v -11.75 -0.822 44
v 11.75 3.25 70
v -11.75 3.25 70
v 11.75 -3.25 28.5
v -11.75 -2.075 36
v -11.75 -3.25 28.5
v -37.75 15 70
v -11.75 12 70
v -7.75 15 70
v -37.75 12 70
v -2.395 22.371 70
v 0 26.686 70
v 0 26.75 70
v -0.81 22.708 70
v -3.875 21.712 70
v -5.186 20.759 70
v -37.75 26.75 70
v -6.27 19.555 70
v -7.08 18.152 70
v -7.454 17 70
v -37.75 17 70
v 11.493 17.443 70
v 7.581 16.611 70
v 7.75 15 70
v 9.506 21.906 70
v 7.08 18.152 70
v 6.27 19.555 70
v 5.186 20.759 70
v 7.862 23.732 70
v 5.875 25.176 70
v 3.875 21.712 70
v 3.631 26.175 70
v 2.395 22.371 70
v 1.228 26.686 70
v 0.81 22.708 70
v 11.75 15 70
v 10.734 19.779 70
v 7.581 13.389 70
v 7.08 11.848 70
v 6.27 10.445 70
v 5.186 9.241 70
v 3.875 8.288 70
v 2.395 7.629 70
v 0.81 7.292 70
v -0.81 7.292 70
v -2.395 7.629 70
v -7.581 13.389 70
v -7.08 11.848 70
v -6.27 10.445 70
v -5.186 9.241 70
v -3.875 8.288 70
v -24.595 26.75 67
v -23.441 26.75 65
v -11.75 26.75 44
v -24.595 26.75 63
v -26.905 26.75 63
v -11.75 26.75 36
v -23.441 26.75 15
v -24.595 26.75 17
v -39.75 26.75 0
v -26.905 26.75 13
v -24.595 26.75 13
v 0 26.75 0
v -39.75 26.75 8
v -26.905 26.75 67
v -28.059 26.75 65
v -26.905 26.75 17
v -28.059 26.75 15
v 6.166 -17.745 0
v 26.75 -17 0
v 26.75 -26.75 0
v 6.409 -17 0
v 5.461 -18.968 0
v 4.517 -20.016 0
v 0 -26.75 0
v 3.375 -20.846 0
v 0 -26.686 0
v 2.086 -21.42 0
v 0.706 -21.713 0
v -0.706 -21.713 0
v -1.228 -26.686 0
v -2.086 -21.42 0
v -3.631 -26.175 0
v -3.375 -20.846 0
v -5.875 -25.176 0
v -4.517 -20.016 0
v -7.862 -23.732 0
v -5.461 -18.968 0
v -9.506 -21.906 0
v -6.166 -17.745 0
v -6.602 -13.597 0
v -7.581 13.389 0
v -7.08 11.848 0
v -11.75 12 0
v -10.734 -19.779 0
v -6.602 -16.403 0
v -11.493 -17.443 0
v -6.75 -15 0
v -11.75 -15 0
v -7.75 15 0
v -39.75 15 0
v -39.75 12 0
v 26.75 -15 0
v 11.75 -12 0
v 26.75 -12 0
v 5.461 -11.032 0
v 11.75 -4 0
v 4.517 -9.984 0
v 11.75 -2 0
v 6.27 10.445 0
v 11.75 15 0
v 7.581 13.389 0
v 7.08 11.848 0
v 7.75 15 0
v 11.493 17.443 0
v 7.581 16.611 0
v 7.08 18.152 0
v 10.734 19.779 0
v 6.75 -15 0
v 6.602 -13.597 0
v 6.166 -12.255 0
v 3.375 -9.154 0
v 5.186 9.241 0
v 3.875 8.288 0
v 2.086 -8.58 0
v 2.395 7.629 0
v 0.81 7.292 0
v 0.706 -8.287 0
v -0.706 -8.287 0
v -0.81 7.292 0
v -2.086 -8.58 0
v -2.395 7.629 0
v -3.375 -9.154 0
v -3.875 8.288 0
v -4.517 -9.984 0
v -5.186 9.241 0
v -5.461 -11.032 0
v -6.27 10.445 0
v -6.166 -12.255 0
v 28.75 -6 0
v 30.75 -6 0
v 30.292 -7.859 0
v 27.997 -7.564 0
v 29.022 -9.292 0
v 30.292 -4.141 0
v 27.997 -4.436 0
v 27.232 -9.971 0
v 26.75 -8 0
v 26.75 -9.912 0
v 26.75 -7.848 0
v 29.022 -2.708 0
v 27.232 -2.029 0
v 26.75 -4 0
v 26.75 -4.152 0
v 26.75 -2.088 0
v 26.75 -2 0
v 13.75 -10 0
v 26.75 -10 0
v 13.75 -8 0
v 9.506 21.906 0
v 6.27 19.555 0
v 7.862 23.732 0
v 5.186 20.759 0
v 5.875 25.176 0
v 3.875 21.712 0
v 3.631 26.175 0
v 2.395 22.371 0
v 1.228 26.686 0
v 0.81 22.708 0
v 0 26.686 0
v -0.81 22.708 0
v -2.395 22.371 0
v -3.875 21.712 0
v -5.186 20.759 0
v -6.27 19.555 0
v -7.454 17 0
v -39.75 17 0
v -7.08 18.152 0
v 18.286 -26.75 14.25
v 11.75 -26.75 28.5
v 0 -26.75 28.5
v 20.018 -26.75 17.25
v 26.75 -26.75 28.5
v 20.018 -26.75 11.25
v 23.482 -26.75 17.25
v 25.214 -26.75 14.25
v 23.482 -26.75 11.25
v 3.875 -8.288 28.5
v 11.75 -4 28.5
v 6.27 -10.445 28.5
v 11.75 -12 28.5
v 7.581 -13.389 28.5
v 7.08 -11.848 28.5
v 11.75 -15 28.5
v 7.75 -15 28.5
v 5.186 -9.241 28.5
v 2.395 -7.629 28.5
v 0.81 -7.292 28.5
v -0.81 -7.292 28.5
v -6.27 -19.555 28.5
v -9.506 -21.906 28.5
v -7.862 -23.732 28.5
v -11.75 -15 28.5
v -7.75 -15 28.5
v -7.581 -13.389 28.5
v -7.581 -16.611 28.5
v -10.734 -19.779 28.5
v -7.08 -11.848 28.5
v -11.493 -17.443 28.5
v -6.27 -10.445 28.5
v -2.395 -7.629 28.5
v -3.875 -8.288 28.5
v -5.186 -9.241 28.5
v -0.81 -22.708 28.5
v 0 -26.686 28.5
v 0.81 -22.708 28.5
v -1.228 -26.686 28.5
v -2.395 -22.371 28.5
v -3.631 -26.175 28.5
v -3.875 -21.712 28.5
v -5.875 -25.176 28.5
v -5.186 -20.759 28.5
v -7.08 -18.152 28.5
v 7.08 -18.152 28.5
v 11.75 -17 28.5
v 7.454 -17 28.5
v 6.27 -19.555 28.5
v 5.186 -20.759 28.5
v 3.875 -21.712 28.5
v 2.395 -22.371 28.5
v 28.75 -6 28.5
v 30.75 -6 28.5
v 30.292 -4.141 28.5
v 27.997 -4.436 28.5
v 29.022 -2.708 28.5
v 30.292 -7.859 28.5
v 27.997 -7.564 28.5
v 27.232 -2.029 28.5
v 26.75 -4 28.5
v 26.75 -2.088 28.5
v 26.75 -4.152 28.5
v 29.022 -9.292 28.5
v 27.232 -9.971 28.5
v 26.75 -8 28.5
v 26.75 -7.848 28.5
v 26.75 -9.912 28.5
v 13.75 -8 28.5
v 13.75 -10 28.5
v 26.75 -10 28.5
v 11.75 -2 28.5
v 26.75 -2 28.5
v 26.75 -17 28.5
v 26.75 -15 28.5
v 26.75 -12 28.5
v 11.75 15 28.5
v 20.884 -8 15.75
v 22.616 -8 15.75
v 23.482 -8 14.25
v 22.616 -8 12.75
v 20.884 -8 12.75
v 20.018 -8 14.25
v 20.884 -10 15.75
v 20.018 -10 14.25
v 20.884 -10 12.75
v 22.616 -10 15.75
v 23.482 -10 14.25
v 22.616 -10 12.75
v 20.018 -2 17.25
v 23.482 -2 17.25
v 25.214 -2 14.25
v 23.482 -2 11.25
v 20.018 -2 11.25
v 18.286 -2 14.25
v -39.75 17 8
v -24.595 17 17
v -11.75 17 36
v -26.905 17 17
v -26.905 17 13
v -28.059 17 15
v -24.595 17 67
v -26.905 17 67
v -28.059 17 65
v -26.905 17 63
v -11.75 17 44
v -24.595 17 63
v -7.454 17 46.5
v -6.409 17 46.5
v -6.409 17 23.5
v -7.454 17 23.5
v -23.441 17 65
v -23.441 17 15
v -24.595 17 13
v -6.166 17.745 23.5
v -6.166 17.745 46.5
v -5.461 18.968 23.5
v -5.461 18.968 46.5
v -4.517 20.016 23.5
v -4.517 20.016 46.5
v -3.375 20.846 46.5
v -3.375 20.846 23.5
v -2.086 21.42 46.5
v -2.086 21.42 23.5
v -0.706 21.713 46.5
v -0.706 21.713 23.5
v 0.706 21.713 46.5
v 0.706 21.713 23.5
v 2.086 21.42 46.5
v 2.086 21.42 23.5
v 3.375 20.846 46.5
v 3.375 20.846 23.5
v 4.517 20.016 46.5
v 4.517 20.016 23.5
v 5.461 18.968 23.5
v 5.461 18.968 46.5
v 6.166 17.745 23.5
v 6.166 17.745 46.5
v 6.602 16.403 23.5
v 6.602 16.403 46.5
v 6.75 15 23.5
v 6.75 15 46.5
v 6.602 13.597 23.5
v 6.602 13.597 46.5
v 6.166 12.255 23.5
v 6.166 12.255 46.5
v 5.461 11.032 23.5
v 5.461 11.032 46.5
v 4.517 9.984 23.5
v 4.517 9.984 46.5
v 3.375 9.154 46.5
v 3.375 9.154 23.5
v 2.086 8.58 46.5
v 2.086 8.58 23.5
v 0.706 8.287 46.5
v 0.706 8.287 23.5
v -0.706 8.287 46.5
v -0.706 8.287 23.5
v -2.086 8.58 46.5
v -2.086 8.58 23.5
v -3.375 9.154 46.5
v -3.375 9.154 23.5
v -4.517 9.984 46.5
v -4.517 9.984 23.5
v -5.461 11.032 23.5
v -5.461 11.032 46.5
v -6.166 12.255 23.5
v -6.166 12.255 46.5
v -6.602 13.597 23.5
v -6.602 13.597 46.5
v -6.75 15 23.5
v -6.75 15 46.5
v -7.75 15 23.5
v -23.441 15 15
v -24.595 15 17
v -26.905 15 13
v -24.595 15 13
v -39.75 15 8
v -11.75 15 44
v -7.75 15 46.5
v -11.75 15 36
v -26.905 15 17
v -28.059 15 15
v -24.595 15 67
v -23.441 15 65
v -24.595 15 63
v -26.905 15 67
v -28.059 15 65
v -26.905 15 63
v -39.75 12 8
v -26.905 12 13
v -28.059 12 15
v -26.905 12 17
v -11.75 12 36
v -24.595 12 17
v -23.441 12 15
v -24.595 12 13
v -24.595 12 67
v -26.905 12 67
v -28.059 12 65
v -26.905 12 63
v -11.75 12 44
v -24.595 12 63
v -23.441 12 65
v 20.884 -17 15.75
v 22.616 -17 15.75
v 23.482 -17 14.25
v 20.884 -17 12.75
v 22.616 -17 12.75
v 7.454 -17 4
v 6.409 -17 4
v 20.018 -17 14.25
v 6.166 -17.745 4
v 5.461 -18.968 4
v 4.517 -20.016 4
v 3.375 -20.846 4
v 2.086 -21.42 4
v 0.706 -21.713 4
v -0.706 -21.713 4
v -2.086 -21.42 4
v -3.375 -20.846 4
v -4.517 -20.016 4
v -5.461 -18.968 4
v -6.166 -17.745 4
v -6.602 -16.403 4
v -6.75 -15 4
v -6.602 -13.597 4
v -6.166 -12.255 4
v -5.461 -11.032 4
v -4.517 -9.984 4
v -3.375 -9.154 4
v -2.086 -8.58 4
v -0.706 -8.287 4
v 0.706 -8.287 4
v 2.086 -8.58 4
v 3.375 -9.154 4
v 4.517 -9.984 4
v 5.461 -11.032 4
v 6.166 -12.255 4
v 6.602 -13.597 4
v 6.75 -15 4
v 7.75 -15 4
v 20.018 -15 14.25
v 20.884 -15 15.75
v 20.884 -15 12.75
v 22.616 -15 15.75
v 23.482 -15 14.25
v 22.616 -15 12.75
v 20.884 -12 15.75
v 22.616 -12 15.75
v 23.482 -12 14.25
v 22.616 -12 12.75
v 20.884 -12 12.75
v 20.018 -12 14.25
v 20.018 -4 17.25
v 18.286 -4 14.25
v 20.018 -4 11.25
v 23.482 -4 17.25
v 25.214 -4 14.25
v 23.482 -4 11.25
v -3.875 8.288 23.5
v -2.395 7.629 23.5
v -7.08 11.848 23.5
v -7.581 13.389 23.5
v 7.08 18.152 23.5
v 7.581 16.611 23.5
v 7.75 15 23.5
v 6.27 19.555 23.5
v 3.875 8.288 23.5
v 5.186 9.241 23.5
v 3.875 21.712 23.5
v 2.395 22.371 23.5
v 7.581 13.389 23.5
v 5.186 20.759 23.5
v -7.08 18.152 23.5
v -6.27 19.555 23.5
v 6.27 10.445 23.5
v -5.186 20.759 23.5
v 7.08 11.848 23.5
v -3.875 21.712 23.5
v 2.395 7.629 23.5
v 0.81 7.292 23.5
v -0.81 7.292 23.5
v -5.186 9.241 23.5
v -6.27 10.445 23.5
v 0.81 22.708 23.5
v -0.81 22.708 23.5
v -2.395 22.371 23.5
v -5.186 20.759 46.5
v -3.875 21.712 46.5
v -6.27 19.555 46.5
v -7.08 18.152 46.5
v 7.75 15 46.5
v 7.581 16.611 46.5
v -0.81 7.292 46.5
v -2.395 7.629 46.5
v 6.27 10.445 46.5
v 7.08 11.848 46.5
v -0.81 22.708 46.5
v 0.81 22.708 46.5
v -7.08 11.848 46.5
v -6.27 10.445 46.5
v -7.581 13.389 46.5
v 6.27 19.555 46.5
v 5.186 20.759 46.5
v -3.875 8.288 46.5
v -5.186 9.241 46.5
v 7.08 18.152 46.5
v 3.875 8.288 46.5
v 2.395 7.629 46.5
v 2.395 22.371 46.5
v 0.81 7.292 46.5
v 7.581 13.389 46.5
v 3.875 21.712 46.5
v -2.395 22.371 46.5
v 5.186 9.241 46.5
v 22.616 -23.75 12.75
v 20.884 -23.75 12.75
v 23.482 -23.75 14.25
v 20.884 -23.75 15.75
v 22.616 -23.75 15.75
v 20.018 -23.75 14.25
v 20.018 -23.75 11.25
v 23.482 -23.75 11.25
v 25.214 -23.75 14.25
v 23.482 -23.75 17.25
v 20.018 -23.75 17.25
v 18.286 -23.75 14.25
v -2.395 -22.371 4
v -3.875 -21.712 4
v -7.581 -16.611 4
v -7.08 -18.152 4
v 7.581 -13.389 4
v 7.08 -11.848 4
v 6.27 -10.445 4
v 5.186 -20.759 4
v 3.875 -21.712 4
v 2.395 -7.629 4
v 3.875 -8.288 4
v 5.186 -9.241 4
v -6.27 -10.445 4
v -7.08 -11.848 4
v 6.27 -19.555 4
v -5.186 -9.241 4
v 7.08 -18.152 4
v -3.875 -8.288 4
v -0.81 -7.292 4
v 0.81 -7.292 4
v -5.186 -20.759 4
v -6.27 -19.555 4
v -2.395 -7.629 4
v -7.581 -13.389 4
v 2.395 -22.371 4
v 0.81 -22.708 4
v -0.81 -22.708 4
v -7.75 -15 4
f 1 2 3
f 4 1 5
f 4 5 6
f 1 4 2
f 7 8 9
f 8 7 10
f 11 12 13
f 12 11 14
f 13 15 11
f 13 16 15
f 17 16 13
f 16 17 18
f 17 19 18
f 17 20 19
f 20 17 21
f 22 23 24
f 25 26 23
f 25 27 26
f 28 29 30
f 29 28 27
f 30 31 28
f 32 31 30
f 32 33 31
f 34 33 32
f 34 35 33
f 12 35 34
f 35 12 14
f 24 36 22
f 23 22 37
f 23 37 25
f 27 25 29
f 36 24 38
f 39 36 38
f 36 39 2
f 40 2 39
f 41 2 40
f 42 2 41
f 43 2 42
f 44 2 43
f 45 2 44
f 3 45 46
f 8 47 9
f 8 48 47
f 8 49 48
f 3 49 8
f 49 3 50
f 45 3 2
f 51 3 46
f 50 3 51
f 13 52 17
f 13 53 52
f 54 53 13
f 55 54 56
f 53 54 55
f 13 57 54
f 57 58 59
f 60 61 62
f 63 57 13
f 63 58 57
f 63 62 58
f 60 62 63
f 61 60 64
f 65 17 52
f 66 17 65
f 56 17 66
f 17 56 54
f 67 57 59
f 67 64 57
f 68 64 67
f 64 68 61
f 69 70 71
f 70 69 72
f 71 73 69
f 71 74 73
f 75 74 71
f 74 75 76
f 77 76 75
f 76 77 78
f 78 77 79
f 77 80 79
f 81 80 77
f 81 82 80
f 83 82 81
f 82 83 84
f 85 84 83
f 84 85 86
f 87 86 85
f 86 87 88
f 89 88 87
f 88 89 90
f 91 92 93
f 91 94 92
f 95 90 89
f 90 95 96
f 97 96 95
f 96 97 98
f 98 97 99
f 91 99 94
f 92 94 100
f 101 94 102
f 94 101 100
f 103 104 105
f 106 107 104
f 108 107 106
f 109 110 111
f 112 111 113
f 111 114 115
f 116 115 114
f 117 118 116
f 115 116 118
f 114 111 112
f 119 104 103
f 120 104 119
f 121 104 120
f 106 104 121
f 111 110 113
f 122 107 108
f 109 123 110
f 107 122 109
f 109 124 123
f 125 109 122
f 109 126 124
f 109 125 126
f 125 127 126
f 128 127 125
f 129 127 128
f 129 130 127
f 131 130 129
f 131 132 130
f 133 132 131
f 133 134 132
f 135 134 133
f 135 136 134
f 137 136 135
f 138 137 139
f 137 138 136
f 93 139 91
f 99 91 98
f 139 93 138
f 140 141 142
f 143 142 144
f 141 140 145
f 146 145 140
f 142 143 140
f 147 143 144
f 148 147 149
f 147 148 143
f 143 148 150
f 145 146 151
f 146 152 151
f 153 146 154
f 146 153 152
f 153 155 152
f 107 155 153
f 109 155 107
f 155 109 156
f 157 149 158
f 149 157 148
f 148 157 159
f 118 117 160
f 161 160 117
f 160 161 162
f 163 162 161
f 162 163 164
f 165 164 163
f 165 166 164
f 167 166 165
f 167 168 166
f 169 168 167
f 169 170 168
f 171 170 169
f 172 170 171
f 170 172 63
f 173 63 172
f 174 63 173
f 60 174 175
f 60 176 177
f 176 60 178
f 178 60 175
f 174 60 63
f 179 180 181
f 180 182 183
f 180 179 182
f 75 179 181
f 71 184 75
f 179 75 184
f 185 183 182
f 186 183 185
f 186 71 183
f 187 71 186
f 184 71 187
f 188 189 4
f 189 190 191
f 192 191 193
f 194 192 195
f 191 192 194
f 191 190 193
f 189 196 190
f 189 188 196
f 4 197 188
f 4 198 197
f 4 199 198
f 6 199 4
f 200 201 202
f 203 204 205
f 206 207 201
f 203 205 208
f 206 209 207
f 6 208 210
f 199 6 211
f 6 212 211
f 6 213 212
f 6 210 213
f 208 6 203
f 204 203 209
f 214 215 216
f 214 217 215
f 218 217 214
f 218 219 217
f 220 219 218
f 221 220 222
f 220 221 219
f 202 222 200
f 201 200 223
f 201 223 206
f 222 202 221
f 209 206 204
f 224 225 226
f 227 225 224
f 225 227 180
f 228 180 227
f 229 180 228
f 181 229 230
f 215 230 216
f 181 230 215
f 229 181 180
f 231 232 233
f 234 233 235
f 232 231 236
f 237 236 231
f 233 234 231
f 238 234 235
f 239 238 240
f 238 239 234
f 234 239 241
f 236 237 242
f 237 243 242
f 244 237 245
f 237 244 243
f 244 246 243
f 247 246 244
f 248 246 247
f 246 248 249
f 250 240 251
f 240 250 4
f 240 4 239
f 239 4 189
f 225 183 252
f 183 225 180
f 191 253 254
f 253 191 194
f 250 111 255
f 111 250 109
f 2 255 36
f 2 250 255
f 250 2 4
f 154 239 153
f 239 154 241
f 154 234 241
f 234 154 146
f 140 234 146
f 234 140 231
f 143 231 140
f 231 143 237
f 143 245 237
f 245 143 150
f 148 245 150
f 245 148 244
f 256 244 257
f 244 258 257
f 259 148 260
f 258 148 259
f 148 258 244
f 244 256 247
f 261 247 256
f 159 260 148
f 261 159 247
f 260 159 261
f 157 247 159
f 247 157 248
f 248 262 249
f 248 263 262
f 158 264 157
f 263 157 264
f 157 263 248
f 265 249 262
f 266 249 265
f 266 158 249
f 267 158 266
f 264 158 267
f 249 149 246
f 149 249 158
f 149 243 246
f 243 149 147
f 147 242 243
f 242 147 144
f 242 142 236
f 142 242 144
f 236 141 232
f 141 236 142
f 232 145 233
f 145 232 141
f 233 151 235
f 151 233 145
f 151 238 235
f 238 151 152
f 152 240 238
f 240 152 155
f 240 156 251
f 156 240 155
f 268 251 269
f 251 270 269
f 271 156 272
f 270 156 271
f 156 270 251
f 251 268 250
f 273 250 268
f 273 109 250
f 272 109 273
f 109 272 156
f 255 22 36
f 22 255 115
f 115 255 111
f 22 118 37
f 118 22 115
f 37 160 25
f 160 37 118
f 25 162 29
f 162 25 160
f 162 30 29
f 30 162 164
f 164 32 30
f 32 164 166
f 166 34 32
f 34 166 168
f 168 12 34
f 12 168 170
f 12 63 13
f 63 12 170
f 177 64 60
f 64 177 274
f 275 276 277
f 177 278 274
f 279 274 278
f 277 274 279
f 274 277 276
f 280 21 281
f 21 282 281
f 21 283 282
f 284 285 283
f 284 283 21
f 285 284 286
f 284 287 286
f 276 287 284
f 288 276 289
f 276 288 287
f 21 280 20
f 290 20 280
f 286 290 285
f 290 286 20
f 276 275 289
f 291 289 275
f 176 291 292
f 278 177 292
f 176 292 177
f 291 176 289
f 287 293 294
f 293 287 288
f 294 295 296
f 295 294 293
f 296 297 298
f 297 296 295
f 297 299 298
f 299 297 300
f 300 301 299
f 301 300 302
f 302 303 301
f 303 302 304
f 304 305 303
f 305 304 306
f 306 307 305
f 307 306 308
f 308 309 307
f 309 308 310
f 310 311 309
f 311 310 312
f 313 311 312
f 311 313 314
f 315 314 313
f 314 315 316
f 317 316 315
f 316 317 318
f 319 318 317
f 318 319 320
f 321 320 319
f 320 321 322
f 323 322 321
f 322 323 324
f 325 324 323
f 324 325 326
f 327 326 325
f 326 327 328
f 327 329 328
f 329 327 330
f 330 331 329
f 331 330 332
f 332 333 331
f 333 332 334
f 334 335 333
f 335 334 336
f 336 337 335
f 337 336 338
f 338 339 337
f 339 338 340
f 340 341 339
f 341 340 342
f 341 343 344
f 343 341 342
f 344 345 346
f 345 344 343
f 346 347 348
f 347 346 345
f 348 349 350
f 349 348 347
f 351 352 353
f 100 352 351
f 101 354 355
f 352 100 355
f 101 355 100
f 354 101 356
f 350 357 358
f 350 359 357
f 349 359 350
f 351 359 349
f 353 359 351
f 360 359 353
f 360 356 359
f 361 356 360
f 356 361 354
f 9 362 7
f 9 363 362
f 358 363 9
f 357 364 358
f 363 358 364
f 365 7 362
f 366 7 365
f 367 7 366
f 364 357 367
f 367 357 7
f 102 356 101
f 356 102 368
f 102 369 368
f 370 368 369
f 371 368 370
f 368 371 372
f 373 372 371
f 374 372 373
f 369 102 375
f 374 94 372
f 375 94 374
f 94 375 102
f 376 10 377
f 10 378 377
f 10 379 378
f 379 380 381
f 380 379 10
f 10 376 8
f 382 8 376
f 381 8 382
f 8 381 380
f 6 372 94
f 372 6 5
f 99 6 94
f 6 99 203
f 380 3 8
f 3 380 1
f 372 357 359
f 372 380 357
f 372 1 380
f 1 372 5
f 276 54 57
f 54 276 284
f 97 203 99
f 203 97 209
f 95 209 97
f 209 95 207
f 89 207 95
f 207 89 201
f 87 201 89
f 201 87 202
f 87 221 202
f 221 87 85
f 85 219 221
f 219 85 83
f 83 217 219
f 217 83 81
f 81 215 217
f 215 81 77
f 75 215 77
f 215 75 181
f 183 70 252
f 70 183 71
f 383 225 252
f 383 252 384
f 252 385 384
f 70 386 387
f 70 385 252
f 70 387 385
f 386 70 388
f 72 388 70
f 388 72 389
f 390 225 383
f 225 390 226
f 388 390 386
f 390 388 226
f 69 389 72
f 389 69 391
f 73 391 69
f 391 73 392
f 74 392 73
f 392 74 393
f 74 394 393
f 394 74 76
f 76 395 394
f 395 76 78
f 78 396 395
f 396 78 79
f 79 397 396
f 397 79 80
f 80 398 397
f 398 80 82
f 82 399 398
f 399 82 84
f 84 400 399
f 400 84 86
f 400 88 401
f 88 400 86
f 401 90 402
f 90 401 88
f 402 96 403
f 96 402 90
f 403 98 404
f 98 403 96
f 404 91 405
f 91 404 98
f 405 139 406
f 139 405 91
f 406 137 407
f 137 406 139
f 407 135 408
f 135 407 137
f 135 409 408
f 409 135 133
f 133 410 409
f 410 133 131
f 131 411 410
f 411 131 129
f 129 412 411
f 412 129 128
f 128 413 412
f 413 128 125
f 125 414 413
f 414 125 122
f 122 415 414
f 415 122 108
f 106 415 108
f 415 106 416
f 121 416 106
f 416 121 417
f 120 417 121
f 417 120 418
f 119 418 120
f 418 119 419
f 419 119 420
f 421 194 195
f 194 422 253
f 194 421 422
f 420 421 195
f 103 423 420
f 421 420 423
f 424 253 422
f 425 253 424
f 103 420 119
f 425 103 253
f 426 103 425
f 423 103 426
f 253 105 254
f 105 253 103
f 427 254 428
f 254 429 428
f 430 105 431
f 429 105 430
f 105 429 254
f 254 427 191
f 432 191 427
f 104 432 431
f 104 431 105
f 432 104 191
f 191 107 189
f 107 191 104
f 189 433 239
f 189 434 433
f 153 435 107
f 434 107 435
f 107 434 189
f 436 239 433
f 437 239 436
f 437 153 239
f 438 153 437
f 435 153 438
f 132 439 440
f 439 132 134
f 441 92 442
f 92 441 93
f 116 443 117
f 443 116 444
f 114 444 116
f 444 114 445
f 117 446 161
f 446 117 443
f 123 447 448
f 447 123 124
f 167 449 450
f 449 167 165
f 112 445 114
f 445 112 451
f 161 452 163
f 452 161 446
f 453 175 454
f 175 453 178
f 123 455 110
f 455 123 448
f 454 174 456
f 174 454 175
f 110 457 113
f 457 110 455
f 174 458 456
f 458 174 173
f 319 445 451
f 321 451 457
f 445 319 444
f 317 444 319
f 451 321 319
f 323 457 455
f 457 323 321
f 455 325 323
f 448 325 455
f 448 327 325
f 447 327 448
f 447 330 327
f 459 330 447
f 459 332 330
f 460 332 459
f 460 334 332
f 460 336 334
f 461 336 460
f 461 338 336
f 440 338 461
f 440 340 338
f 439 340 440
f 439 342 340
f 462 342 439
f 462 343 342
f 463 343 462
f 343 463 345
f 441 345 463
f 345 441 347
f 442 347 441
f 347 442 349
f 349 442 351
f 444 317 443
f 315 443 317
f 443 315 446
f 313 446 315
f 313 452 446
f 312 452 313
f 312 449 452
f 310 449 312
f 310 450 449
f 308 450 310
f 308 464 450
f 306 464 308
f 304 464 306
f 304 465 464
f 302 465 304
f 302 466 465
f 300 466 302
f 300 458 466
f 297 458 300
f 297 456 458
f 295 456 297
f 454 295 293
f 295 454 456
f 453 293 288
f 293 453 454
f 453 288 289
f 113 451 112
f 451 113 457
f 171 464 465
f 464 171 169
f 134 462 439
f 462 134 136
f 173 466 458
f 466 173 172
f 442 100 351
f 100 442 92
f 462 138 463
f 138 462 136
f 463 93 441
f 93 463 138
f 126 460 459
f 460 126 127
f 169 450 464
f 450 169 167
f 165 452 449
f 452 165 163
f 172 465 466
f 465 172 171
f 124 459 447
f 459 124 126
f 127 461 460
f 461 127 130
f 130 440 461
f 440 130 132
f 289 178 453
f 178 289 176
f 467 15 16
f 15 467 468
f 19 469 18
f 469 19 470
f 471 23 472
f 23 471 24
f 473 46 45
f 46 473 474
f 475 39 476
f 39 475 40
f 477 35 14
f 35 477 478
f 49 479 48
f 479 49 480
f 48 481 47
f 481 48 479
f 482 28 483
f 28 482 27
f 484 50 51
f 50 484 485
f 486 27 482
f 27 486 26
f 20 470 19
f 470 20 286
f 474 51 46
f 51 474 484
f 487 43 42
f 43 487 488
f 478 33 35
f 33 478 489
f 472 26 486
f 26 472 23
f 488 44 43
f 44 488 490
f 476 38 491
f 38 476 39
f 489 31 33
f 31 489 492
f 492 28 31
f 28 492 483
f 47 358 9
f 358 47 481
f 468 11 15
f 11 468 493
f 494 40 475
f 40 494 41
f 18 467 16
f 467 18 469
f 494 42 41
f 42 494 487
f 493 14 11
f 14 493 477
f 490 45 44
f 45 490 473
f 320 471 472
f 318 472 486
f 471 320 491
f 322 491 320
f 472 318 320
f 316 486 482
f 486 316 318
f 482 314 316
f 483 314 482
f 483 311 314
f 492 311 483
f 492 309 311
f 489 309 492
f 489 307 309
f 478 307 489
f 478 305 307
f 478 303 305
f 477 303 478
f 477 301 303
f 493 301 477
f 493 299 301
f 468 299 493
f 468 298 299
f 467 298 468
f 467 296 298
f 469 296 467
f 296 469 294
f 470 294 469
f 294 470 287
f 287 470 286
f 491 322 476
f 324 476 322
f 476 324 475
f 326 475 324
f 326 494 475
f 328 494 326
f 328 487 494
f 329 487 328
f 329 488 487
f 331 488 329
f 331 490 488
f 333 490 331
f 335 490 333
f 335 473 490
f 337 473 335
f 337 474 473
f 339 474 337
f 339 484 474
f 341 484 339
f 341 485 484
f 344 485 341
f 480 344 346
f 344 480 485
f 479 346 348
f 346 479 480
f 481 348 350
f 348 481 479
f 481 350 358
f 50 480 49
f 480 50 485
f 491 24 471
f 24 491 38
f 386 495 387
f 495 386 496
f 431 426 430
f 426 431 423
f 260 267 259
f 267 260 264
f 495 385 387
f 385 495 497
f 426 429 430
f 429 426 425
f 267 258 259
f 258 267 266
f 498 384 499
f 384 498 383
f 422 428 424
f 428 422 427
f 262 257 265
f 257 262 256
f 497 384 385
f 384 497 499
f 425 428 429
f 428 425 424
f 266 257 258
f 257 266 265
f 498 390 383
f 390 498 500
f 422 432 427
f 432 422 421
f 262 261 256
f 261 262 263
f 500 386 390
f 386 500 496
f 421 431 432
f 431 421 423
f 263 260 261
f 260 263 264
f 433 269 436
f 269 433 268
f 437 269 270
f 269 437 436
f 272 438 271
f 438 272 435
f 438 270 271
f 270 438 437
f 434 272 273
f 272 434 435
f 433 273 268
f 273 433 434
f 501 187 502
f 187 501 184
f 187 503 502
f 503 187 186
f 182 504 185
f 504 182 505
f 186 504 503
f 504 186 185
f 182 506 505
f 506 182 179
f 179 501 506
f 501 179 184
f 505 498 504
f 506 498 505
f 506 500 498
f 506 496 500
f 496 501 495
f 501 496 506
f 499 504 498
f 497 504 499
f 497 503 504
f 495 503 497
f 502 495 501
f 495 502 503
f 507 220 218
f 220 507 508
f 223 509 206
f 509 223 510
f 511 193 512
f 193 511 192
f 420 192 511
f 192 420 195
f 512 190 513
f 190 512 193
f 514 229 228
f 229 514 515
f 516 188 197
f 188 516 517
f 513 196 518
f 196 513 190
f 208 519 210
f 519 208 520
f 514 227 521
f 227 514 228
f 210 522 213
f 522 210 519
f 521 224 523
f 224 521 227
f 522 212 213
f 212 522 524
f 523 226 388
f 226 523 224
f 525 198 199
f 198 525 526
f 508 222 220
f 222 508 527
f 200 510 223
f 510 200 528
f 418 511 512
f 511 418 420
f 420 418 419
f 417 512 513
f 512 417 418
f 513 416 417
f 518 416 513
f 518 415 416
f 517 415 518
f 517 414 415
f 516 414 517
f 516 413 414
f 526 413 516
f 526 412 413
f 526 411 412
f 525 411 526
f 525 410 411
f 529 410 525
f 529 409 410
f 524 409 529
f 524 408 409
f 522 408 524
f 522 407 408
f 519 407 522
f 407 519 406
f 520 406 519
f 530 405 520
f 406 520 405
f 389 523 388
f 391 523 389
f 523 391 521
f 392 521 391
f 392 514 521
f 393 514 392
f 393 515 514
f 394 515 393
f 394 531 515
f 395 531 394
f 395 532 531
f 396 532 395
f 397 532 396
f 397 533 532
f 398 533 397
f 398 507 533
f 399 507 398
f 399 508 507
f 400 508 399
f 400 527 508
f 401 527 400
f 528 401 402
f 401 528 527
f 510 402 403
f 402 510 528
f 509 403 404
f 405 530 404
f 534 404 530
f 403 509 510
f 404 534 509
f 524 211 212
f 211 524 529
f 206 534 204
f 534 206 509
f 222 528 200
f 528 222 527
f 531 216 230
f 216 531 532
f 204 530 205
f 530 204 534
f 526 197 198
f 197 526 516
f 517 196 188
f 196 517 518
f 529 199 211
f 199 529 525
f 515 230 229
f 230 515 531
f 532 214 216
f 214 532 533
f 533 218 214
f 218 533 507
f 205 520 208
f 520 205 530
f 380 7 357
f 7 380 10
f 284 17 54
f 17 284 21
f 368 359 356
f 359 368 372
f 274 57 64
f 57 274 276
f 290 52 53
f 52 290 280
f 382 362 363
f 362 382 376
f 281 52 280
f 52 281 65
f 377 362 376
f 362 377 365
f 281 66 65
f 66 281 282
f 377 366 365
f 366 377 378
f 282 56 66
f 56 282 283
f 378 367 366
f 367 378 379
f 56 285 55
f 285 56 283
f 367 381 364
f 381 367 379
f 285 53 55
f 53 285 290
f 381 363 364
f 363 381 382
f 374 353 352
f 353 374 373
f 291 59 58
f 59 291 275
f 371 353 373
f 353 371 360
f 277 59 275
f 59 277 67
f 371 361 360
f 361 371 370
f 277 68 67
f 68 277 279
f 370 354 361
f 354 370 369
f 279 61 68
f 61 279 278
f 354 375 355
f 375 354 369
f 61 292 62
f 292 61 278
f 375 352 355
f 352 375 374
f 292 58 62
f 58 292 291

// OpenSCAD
// file: settings.scad
rod_size = 8;
rod_nut_size = 15; //12 for M6, 15 for M8
bearing_size = 15.5; //12.5 for LM6UU, 15.5 for LM8UU,LM8SUU
bearing_length = 24.5; //19.5 for LM6UU, 17.5 for LM8SUU, 24.5 for LM8UU
yz_motor_distance = 25;
motor_screw_spacing = 26; //26 for NEMA14, 31 for NEMA17
motor_casing = 38; //38 for NEMA14, 45 for NEMA17
end_height = 40; //measure the height of your motor casing and add 4mm. Suggestion: 40 for NEMA14, 55 for NEMA17
bed_mount_height = 16;
//x_rod_spacing = motor_screw_spacing + 3 + rod_size;
x_rod_spacing = 30;
x_carriage_width = 70;
carriage_extruder_offset = 5;
pulley_size = 20;
idler_pulley_width = 10;
gusset_size = 15;
m3_size = 3;
m3_nut_size = 6;
m4_size = 4;
motor_shaft_size = 5;

// ratio for converting diameter to apothem
da6 = 1 / cos(180 / 6) / 2;
da8 = 1 / cos(180 / 8) / 2;
// main file
include <settings.scad>;

!x_carriage();

module x_carriage() difference() {
	intersection() {
		linear_extrude(height = x_carriage_width, convexity = 5) difference() {
			union() {
				square([bearing_size + 8, x_rod_spacing], center = true);
				translate([0, -x_rod_spacing / 2 - bearing_size / 2 - 4, 0]) square([bearing_size / 2 + 4 + 15, x_rod_spacing / 2 + bearing_size / 2 + 4 - 2 - pulley_size / 2]);
				translate([0, -pulley_size / 2, 0]) {
					square([bearing_size / 2 + 4 + 15, 8]);
					translate([bearing_size / 2 + 4 + 15, 4, 0]) circle(4);
				}
				rotate(180) translate([0, -x_rod_spacing / 2 - bearing_size / 2 - 4, 0]) square([bearing_size / 2 + 4 + 28, bearing_size / 2 + 4 + 3]);
				for(side = [1, -1]) translate([0, side * x_rod_spacing / 2, 0]) circle(bearing_size / 2 + 4, $fn = 30);
			}
			translate([bearing_size / 2 + 4, 2 - pulley_size / 2, 0]) {
				square([15, 4]);
				translate([0, -3, 0]) square([2, 4]);
				translate([15, 2, 0]) circle(2);
			}
			for(side = [1, -1]) translate([0, side * x_rod_spacing / 2, 0]) {
				circle(bearing_size / 2 -1, $fn = 30);
				rotate(90 * side) square([2, bearing_size / 2 + 40]);
			}
		}
		difference() {
			rotate([0, -90, 0]) linear_extrude(height = bearing_size + 100, convexity = 5, center = true) difference() {
				polygon([
					[
						0,
						(x_rod_spacing / 2 + bearing_size / 2 + 4)
					],[
						0,
						-(x_rod_spacing / 2 + bearing_size / 2 + 4)
					],[
						bearing_length + 4,
						-(x_rod_spacing / 2 + bearing_size / 2 + 4)
					],[
						bearing_length + 4,
						-(x_rod_spacing / 2 - bearing_size / 2 - 4)
					],[
						x_carriage_width,
						(x_rod_spacing / 2 - bearing_size / 2 - 4)
					],[
						x_carriage_width,
						(x_rod_spacing / 2 + bearing_size / 2 + 4)
					]
				]);
			}
			translate([bearing_size / 2 + 4, -50, bearing_length + 4]) cube(100);
		}
	}
	// linear bearings
	translate([0, x_rod_spacing / 2, 0]) rotate([0, 0, 0]) {
		%translate([0, 0, 20]) rotate(180 / 8) cylinder(r = rod_size * da8, h = 200, center = true, $fn = 8);
		for(end = [0, 1]) mirror([0, 0, end]) translate([0, 0, end * -x_carriage_width - 1]) cylinder(r = bearing_size / 2, h = bearing_length, $fn = 30);
	}
	translate([0, -x_rod_spacing / 2, 0]) rotate([0, 0, 0]) {
		translate([0, 0, 4]) cylinder(r = bearing_size / 2, h = x_carriage_width + 1, center = false, $fn = 30);
		%translate([0, 0,20]) rotate(180 / 8) cylinder(r = rod_size * da8, h = 200, center = true, $fn = 8);
	}
	// screw holes
	translate([bearing_size / 2 + 4 + 10, 5 - pulley_size / 2, bearing_length / 2 + 2]) rotate([90, 0, 0]) {
		cylinder(r = m3_size * da6, h = x_rod_spacing + bearing_size + 10, center = true, $fn = 6);
		rotate([180, 0, 0]) cylinder(r = m3_size * da6 * 2, h = x_rod_spacing + bearing_size + 10, center = false, $fn = 6);
		translate([0, 0, x_rod_spacing / 2 + bearing_size / 2 + 6 - pulley_size / 2]) cylinder(r = m3_nut_size * da6, h = x_rod_spacing + bearing_size + 10, center = false, $fn = 6);
	}
	//#for(side = [1, -1]) translate([-bearing_size / 2 - 4 - 14, 0, x_carriage_width / 2 + carriage_extruder_offset + side * 25]) rotate([90, 0, 0]) cylinder(r = 4.1, h = x_rod_spacing - 10, center = true, $fn = 6);
	translate([-bearing_size / 2 - 4 - 14, 0, x_carriage_width / 2 + carriage_extruder_offset]) rotate([90, 0, 0]) linear_extrude(height = bearing_size + x_rod_spacing + 10, center = true, convexity = 5) {
		*translate([-14, 0, 0]) {
			circle(20);
			rotate(45) square(5);
		}
		intersection() {
			translate([18, 0, 0]) rotate(135) square(100);
			translate([-14, 0, 0]) square([56, 100], center = true);
		}
		for(side = [1, -1]) translate([0, side * 25, 0]) circle(m4_size * da6, $fn = 6);
	}
}
